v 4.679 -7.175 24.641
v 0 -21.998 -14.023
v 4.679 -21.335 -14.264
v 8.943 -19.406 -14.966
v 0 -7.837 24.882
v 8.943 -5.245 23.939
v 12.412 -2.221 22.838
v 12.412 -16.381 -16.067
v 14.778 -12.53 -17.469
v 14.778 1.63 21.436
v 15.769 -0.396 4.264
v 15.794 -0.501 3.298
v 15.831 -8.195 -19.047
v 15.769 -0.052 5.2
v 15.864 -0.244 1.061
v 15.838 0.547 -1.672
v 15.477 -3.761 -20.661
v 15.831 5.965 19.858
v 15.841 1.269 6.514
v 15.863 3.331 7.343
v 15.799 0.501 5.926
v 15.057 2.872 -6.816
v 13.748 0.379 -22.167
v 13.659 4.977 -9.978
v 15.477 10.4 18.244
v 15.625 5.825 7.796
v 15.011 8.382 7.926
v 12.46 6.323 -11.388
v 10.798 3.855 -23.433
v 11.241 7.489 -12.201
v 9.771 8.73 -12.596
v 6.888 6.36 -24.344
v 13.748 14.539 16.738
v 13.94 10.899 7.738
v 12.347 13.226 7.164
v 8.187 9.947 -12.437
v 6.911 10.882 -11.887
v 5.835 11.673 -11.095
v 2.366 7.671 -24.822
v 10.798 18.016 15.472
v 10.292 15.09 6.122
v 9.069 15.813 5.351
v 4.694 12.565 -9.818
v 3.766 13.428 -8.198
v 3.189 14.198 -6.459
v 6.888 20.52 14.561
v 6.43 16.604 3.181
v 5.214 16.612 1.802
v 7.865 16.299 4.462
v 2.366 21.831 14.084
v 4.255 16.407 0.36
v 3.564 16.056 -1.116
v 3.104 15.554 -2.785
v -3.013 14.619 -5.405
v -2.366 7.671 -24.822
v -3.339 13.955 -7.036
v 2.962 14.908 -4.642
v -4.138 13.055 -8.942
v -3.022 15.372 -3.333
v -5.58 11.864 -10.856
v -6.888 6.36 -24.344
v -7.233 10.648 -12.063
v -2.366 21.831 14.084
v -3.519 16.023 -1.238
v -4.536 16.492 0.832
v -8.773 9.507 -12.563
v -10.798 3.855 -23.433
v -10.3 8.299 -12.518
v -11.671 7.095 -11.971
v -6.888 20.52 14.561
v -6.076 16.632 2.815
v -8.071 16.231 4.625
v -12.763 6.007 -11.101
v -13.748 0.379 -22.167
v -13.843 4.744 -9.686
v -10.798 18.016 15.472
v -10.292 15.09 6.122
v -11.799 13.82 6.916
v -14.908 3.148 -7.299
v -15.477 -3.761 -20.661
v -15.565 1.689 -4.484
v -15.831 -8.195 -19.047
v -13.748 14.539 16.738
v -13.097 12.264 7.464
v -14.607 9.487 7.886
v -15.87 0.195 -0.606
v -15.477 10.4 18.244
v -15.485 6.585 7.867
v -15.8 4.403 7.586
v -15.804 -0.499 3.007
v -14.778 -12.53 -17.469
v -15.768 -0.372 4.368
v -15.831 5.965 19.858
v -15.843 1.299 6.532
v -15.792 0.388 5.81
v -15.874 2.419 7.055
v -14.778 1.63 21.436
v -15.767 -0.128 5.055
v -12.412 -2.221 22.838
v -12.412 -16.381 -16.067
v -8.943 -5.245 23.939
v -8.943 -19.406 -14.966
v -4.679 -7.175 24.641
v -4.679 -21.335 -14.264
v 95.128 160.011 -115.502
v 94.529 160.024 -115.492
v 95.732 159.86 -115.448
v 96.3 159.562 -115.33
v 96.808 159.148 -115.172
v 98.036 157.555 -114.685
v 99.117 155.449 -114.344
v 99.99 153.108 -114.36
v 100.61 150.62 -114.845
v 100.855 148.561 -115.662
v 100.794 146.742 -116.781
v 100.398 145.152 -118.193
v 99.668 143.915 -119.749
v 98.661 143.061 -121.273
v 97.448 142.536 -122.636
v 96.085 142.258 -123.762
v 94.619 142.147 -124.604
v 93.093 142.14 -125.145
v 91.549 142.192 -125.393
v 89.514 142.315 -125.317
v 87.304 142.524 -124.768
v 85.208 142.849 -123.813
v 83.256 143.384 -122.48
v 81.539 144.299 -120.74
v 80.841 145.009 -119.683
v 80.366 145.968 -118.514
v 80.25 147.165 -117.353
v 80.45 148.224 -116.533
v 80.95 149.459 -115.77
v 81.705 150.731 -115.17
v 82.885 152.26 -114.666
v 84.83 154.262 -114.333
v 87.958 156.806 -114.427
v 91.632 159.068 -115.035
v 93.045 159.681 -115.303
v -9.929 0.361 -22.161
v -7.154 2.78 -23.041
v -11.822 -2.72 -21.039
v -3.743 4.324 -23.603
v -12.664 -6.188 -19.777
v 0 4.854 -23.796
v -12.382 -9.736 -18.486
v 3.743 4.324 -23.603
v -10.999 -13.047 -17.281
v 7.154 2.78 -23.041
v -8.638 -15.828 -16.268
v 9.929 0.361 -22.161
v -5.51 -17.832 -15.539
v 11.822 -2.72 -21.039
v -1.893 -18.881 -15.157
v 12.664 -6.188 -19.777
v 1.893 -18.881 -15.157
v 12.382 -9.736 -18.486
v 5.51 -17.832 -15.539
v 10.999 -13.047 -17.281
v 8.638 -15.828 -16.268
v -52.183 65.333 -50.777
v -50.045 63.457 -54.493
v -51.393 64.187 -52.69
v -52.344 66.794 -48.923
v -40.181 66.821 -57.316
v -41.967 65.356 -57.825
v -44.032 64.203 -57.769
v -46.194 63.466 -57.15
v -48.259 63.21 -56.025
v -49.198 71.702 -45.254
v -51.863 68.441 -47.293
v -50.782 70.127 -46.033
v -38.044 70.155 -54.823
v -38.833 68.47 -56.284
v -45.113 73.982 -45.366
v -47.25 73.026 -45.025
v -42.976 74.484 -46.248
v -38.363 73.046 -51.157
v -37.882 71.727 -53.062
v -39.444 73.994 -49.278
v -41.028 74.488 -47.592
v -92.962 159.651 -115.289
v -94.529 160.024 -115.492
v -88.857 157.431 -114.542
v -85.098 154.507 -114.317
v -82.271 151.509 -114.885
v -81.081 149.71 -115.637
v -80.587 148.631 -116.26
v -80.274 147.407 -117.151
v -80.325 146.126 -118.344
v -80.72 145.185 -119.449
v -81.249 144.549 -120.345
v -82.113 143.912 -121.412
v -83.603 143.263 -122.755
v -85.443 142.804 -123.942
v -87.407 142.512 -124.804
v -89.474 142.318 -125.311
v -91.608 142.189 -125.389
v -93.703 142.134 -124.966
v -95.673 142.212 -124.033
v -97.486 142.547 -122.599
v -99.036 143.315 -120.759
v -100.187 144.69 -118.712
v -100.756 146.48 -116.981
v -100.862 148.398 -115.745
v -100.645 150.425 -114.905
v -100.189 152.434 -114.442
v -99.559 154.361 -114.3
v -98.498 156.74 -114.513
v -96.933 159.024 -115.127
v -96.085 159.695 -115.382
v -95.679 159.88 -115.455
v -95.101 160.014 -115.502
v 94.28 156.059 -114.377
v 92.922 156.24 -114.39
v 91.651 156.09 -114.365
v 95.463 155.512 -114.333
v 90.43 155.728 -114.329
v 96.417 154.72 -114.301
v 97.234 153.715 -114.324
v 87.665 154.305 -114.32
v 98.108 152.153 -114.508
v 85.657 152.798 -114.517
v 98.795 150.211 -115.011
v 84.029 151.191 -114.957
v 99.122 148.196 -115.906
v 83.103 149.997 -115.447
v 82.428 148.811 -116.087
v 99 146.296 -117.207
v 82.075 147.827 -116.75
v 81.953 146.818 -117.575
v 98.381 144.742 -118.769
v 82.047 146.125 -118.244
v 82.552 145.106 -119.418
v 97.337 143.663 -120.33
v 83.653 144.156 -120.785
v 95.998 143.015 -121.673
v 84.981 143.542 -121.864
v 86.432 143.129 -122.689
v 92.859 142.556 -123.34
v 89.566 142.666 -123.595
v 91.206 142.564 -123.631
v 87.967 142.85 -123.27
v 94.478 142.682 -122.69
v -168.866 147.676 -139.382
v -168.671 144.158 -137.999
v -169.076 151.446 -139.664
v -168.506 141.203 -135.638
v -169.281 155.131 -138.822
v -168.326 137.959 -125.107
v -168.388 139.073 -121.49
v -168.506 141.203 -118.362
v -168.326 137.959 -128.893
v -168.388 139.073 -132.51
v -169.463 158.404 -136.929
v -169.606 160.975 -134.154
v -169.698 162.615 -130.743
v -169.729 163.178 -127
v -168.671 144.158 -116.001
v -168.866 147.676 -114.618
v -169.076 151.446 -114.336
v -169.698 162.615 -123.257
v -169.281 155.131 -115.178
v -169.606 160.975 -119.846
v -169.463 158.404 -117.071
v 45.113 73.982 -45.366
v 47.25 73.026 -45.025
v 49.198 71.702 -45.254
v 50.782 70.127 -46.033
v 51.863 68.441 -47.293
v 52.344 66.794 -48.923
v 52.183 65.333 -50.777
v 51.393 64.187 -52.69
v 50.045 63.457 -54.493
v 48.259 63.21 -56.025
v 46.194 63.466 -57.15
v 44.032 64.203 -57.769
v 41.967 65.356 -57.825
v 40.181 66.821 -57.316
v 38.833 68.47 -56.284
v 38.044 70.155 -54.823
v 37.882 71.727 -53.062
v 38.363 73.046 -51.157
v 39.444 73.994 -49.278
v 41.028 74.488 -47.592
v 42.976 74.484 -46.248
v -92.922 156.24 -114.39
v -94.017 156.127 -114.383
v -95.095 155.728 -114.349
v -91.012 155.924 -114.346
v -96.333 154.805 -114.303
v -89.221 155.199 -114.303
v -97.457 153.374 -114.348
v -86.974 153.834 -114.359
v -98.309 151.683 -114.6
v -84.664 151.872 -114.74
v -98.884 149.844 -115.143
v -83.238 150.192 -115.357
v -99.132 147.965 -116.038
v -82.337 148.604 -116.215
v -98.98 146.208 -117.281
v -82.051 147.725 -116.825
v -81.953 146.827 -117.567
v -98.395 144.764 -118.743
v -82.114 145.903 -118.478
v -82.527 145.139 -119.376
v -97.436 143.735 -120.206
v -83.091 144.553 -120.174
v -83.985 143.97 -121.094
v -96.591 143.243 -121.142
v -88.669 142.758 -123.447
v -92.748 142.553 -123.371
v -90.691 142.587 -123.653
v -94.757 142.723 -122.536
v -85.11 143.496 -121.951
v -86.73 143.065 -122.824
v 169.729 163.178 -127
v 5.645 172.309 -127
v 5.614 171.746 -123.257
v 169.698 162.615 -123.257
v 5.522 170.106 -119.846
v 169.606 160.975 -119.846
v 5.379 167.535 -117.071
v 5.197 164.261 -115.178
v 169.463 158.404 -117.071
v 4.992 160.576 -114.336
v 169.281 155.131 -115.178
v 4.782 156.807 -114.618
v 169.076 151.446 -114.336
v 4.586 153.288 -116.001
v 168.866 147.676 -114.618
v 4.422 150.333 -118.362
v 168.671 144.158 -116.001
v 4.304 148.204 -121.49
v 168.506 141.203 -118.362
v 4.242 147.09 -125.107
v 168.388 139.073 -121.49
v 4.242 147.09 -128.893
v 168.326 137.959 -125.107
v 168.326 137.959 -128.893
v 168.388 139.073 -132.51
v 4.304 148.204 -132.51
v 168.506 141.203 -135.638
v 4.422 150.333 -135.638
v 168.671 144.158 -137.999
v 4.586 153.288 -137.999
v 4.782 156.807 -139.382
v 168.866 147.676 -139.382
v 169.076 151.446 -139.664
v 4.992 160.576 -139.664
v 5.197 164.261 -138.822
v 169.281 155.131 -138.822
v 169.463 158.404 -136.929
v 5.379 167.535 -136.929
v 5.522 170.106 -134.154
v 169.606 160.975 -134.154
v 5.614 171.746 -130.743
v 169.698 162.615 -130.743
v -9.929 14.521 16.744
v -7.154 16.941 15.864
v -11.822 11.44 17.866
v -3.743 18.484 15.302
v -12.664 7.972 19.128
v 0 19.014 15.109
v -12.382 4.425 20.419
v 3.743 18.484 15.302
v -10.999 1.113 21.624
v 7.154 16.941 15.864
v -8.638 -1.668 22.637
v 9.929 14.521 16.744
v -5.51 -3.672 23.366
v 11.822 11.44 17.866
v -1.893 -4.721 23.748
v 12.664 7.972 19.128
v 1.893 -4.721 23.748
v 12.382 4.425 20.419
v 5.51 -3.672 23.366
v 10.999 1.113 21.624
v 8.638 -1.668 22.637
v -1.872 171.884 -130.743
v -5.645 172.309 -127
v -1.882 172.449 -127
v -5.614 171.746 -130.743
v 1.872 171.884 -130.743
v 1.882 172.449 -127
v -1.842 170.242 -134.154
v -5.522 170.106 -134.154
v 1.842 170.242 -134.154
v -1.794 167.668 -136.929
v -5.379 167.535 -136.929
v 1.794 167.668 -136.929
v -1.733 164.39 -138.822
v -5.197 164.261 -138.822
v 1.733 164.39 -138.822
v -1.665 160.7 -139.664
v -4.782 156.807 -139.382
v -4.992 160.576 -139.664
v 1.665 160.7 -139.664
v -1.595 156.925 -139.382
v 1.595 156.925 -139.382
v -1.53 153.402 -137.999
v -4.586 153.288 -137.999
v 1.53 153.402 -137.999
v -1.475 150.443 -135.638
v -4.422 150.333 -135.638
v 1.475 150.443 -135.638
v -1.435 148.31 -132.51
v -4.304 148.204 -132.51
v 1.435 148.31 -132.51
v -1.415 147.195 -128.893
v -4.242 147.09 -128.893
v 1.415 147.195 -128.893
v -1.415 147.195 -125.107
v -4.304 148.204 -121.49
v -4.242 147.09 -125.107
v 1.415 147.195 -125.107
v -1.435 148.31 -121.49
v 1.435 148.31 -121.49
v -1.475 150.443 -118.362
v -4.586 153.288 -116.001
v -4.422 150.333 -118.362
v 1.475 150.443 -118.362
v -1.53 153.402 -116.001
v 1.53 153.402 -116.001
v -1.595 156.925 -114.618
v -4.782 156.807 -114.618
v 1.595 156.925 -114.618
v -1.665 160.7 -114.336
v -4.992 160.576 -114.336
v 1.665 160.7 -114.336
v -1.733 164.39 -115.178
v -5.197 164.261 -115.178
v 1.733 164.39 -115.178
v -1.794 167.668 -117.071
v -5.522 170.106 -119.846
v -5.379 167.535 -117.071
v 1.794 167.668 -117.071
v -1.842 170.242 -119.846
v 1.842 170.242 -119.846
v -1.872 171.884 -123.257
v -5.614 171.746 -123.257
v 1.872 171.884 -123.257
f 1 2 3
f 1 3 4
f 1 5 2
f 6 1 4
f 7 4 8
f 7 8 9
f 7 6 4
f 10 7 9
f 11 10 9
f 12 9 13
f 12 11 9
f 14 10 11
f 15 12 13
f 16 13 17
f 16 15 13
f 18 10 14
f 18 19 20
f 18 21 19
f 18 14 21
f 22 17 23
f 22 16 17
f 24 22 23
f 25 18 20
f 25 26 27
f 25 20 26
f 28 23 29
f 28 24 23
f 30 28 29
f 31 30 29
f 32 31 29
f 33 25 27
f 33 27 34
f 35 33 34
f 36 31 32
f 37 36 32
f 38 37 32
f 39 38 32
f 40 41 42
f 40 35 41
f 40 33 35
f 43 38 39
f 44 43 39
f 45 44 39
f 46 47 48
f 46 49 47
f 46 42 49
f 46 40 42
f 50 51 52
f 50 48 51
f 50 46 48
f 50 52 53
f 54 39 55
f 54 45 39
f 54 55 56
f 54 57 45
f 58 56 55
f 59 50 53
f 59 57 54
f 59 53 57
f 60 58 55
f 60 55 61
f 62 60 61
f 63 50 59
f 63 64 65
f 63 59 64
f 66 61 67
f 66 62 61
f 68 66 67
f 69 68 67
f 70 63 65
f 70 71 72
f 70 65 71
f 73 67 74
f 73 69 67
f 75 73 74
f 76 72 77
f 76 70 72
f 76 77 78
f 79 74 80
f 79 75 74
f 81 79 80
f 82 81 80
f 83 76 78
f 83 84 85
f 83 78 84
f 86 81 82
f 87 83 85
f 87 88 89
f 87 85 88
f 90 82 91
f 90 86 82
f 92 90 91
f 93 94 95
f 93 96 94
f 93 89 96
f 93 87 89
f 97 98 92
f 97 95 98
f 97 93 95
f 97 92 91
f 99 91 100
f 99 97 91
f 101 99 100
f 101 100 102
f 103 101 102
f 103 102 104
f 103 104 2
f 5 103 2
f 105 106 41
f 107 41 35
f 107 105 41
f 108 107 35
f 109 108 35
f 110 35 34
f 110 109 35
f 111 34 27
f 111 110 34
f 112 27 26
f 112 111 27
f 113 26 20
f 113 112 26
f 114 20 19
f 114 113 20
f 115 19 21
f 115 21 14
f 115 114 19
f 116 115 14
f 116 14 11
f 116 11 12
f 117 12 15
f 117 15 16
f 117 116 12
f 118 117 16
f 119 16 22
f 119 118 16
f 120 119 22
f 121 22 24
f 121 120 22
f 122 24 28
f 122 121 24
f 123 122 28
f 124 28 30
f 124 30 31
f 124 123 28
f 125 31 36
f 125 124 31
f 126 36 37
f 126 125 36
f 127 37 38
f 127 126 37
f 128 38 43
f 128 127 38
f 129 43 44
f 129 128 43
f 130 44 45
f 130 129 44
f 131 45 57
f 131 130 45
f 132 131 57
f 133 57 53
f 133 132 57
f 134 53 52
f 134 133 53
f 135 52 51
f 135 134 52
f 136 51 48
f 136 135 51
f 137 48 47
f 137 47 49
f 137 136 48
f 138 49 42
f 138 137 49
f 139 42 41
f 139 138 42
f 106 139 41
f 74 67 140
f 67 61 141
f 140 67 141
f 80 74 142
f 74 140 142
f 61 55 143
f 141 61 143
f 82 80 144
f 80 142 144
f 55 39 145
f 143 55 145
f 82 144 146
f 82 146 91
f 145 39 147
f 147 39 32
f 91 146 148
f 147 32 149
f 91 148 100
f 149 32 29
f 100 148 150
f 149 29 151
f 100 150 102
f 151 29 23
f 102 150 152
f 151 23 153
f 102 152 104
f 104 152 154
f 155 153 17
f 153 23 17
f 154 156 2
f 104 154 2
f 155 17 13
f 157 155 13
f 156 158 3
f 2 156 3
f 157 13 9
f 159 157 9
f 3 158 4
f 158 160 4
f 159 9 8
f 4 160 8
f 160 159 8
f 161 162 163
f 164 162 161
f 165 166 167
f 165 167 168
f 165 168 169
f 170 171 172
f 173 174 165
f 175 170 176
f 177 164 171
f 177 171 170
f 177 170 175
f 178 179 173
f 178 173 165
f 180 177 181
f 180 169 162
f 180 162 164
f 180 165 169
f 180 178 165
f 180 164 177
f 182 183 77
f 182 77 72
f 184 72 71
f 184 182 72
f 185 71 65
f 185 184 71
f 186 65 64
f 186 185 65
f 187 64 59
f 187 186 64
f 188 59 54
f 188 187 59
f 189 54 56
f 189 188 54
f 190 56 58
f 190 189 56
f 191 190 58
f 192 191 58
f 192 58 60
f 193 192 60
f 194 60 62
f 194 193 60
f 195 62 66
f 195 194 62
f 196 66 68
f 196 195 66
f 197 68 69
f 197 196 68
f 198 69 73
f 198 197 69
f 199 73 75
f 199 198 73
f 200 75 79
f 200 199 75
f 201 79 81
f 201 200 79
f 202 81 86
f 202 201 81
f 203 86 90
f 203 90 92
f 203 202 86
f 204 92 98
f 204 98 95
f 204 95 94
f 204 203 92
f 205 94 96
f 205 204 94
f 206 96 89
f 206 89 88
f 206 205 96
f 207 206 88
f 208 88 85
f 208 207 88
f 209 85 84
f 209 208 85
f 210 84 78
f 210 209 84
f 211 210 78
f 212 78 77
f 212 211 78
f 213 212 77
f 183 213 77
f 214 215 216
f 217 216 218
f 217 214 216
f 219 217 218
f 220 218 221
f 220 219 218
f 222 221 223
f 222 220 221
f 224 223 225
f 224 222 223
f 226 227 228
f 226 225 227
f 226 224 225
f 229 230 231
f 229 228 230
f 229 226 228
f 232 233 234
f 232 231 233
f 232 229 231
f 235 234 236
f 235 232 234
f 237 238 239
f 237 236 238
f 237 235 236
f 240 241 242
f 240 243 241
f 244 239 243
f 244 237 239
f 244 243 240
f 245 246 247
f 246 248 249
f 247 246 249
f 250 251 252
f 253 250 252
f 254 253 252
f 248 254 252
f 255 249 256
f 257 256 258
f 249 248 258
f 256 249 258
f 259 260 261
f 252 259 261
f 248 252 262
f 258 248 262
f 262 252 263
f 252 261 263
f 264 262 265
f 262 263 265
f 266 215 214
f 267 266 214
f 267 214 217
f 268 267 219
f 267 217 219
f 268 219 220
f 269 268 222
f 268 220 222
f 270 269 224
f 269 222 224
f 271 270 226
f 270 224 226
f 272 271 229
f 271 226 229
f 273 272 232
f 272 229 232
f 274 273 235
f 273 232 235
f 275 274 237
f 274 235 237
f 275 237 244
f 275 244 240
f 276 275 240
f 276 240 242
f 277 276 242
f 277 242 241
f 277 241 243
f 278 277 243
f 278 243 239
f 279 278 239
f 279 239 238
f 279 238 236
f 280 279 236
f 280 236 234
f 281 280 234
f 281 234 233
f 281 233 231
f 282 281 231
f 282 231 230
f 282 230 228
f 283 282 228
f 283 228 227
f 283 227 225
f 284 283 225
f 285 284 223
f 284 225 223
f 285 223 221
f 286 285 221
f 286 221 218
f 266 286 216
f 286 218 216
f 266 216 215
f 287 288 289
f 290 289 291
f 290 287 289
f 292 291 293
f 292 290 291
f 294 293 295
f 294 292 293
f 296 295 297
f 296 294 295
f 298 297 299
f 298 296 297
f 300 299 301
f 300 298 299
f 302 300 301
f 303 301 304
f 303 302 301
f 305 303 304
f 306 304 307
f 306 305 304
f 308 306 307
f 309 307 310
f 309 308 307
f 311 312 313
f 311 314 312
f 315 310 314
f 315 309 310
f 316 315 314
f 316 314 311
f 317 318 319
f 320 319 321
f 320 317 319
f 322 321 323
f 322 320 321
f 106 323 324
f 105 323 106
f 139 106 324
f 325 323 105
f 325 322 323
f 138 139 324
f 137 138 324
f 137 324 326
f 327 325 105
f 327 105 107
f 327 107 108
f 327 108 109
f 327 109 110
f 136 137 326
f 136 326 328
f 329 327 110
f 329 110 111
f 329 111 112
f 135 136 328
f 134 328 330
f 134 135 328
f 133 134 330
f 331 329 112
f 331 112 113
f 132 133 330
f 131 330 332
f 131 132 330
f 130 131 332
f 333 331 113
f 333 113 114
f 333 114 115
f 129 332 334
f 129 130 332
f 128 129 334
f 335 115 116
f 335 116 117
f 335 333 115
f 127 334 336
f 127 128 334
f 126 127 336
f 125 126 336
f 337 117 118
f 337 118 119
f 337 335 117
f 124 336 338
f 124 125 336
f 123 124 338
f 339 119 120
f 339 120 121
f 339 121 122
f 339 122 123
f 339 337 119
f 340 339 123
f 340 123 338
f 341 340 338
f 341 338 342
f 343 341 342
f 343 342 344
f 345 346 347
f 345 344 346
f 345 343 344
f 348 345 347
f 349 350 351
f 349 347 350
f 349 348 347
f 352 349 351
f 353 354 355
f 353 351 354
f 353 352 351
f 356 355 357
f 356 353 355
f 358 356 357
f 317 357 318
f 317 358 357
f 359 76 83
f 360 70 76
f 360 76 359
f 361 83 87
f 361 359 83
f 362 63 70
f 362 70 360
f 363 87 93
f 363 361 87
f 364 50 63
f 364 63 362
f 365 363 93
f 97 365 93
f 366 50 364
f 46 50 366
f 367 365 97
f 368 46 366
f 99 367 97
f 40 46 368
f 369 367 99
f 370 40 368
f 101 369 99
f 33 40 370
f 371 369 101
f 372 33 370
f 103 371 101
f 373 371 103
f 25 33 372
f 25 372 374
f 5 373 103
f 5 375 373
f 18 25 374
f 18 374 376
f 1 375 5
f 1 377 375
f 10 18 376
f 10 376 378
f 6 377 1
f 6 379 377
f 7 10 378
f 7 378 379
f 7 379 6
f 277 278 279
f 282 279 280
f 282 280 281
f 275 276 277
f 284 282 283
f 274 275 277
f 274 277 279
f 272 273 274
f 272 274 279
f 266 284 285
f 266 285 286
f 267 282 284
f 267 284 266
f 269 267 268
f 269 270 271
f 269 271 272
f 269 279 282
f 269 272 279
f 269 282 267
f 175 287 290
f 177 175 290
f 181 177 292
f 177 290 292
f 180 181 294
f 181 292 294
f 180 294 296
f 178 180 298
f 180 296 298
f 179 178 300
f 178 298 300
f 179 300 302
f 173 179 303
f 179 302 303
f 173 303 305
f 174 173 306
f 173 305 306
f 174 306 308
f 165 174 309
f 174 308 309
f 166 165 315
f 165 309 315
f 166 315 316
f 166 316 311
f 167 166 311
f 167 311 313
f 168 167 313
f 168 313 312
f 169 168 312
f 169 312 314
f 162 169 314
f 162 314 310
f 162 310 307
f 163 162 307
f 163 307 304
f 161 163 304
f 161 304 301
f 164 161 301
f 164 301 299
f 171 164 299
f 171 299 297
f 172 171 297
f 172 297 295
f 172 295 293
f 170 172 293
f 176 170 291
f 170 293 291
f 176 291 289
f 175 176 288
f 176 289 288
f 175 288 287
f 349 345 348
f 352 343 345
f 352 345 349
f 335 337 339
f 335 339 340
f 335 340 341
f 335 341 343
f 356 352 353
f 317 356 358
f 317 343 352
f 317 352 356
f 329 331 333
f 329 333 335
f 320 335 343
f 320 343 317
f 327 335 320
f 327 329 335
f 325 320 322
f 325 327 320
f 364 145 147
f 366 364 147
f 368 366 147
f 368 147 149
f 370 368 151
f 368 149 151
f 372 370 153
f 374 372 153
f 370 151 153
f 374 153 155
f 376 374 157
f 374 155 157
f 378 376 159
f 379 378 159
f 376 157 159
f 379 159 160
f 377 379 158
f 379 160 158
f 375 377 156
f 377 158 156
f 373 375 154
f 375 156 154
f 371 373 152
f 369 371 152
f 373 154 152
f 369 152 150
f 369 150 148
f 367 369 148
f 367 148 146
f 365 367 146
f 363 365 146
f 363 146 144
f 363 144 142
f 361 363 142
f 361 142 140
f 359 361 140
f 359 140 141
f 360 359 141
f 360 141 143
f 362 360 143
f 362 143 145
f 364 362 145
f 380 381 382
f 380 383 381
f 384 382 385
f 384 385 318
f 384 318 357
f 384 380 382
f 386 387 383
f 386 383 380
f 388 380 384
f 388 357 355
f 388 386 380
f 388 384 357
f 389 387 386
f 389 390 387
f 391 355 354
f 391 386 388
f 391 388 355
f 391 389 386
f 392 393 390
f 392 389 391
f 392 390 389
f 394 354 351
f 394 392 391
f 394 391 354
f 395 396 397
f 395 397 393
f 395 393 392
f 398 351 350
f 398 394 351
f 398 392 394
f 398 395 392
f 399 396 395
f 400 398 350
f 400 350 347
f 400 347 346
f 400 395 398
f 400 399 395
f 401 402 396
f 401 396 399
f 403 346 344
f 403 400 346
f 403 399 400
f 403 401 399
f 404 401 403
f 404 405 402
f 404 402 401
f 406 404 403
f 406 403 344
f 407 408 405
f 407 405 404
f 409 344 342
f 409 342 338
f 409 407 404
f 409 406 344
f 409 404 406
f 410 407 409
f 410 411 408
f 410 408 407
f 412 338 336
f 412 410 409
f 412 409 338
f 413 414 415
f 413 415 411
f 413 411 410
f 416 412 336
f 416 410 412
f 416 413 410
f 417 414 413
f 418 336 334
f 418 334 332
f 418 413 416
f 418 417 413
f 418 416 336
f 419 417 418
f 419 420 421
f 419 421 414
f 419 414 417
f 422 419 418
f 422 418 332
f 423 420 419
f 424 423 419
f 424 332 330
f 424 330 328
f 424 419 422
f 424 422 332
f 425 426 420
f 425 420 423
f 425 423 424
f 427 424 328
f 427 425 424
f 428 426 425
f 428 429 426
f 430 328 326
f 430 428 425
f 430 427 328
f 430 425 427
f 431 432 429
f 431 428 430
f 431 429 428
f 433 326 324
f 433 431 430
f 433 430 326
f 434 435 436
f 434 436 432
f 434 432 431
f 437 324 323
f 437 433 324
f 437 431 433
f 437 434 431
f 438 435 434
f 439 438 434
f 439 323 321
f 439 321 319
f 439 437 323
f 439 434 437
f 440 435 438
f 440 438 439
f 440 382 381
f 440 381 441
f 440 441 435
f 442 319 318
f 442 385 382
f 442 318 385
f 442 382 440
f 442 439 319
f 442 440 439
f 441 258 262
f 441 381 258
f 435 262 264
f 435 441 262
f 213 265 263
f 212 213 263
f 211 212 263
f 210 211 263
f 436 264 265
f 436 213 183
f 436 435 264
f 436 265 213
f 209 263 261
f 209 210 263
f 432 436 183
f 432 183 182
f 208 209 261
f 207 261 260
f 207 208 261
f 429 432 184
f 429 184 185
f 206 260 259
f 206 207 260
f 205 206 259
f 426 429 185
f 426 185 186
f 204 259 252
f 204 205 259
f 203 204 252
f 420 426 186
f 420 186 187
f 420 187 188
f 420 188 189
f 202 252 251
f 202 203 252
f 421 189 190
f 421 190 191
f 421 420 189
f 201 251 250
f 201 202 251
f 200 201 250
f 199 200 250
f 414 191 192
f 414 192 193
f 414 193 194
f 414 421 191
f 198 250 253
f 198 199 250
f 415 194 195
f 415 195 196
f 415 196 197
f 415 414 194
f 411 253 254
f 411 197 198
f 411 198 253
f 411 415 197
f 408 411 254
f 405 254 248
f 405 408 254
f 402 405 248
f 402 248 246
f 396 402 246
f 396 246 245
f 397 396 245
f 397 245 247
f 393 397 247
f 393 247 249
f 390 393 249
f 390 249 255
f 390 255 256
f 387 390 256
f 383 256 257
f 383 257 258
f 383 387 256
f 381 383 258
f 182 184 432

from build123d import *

# Parameters (mm, degrees)
SKETCH1_R           = 15.875
BOSS_EXTRUDE1_DEPTH = 20.701
SWEEP1_PROFILE_R    = 9.525
SWEEP2_PROFILE_R    = 9.525
CUT_EXTRUDE1_REACH  = 233.612
SKETCH2_R           = 12.7
SKETCH36_R          = 7.9375
CUT_EXTRUDE2_DEPTH  = 127
SKETCH37_R          = 7.9375
CUT_EXTRUDE3_DEPTH  = 127
SWEEP3_PROFILE_R    = 12.7


with BuildPart() as part:
    # Sketch1 → Boss-Extrude1 (new, symmetric)
    with BuildSketch(Plane(origin=(0, 0, 0), x_dir=(1, 0, 0), z_dir=(0, 0.34202014332566943, 0.9396926207859081))):
        with Locations(Location((0, 0, 0), (0, 0, 270))):
            Circle(SKETCH1_R)
    extrude(amount=BOSS_EXTRUDE1_DEPTH, both=True)

    # Sweep1: sweep along a path in Sketch4
    with BuildLine(Plane(origin=(0, 3.126764616, 3.726332964), x_dir=(1, 0, 0), z_dir=(0, 0.6427876096865406, 0.7660444431189771))) as sweep1_path:
        Line((-5.08, -4.081701322), (-96.768607765, 201.854283468))
    # Sweep1 profile (on start of the path) → Sweep1 (sweep)
    with BuildSketch(Plane(origin=(-5.08, 0, 6.35), x_dir=(0, 0.6427876096865406, 0.7660444431189771), z_dir=(-0.4067366430758009, 0.6998164213636971, -0.5872157010580841))):
        Circle(SWEEP1_PROFILE_R)
    sweep(path=sweep1_path.line)

    # Sweep2: sweep along a path in Sketch15
    with BuildLine(Plane(origin=(0, 3.126764616, 3.726332964), x_dir=(1, 0, 0), z_dir=(0, 0.6427876096865406, 0.7660444431189771))) as sweep2_path:
        Line((5.08, -4.081701322), (96.768607765, 201.854283468))
    # Sweep2 profile (on start of the path) → Sweep2 (sweep)
    with BuildSketch(Plane(origin=(5.08, 0, 6.35), x_dir=(0, 0.6427876096865406, 0.766044443118977), z_dir=(0.40673664307580104, 0.6998164213636969, -0.587215701058084))):
        Circle(SWEEP2_PROFILE_R)
    sweep(path=sweep2_path.line)

    # Sketch2 → Cut-Extrude1 (cut, up to next)
    with BuildSketch(Plane(origin=(0, -7.080158987, -19.452576943), x_dir=(-1, 0, 0), z_dir=(0, -0.34202014332566943, -0.9396926207859081)), mode=Mode.PRIVATE) as cut_extrude1_sk1:
        with Locations(Location((0, 0, 0), (0, 0, 90))):
            Circle(SKETCH2_R)
    cut_extrude1_tool1 = extrude(cut_extrude1_sk1.sketch, amount=-CUT_EXTRUDE1_REACH, mode=Mode.PRIVATE) & part.part
    add(cut_extrude1_tool1.solids().sort_by_distance((0, -7.080159, -19.452577))[0], mode=Mode.SUBTRACT)

    # Sketch36 → Cut-Extrude2 (cut)
    with BuildSketch(Plane(origin=(-91.012368417, 156.592603715, -131.396796022), x_dir=(0.9135454575587967, 0.3115870518309583, -0.26143489840681283), z_dir=(-0.40673664307580104, 0.6998164213636969, -0.5872157010580842))):
        with Locations(Location((-6.300922529, -4.864467561, 0), (0, 0, 270.000776077))):
            Circle(SKETCH36_R)
    extrude(amount=-CUT_EXTRUDE2_DEPTH, mode=Mode.SUBTRACT)

    # Sketch37 → Cut-Extrude3 (cut)
    with BuildSketch(Plane(origin=(91.012368417, 156.592603715, -131.396796022), x_dir=(0.9135454575587966, -0.3115870518309586, 0.261434898406813), z_dir=(0.4067366430758013, 0.699816421363697, -0.5872157010580837))):
        with Locations(Location((6.300922529, -4.864467561, 0), (0, 0, 269.999223923))):
            Circle(SKETCH37_R)
    extrude(amount=-CUT_EXTRUDE3_DEPTH, mode=Mode.SUBTRACT)

    # Sweep3: sweep along a path in Sketch40
    with BuildLine(Plane(origin=(-106.934, 0, -127), x_dir=(1, 0, 0), z_dir=(0, 0, 1))) as sweep3_path:
        Line((-62.089448271, 150.498042412), (101.994706052, 159.628680082))
        ThreePointArc((101.994706052, 159.628680082), (106.934, 159.766), (111.873293948, 159.628680082))
        Line((111.873293948, 159.628680082), (275.957448271, 150.498042412))
    # Sweep3 profile (on start of the path) → Sweep3 (sweep)
    with BuildSketch(Plane(origin=(-169.023448271, 150.498042412, -127), x_dir=(-0.0555601119023539, 0.9984553440016224, 0), z_dir=(0.9984553440016224, 0.0555601119023539, 0))):
        Circle(SWEEP3_PROFILE_R)
    sweep(path=sweep3_path.line)


solid = part.part
